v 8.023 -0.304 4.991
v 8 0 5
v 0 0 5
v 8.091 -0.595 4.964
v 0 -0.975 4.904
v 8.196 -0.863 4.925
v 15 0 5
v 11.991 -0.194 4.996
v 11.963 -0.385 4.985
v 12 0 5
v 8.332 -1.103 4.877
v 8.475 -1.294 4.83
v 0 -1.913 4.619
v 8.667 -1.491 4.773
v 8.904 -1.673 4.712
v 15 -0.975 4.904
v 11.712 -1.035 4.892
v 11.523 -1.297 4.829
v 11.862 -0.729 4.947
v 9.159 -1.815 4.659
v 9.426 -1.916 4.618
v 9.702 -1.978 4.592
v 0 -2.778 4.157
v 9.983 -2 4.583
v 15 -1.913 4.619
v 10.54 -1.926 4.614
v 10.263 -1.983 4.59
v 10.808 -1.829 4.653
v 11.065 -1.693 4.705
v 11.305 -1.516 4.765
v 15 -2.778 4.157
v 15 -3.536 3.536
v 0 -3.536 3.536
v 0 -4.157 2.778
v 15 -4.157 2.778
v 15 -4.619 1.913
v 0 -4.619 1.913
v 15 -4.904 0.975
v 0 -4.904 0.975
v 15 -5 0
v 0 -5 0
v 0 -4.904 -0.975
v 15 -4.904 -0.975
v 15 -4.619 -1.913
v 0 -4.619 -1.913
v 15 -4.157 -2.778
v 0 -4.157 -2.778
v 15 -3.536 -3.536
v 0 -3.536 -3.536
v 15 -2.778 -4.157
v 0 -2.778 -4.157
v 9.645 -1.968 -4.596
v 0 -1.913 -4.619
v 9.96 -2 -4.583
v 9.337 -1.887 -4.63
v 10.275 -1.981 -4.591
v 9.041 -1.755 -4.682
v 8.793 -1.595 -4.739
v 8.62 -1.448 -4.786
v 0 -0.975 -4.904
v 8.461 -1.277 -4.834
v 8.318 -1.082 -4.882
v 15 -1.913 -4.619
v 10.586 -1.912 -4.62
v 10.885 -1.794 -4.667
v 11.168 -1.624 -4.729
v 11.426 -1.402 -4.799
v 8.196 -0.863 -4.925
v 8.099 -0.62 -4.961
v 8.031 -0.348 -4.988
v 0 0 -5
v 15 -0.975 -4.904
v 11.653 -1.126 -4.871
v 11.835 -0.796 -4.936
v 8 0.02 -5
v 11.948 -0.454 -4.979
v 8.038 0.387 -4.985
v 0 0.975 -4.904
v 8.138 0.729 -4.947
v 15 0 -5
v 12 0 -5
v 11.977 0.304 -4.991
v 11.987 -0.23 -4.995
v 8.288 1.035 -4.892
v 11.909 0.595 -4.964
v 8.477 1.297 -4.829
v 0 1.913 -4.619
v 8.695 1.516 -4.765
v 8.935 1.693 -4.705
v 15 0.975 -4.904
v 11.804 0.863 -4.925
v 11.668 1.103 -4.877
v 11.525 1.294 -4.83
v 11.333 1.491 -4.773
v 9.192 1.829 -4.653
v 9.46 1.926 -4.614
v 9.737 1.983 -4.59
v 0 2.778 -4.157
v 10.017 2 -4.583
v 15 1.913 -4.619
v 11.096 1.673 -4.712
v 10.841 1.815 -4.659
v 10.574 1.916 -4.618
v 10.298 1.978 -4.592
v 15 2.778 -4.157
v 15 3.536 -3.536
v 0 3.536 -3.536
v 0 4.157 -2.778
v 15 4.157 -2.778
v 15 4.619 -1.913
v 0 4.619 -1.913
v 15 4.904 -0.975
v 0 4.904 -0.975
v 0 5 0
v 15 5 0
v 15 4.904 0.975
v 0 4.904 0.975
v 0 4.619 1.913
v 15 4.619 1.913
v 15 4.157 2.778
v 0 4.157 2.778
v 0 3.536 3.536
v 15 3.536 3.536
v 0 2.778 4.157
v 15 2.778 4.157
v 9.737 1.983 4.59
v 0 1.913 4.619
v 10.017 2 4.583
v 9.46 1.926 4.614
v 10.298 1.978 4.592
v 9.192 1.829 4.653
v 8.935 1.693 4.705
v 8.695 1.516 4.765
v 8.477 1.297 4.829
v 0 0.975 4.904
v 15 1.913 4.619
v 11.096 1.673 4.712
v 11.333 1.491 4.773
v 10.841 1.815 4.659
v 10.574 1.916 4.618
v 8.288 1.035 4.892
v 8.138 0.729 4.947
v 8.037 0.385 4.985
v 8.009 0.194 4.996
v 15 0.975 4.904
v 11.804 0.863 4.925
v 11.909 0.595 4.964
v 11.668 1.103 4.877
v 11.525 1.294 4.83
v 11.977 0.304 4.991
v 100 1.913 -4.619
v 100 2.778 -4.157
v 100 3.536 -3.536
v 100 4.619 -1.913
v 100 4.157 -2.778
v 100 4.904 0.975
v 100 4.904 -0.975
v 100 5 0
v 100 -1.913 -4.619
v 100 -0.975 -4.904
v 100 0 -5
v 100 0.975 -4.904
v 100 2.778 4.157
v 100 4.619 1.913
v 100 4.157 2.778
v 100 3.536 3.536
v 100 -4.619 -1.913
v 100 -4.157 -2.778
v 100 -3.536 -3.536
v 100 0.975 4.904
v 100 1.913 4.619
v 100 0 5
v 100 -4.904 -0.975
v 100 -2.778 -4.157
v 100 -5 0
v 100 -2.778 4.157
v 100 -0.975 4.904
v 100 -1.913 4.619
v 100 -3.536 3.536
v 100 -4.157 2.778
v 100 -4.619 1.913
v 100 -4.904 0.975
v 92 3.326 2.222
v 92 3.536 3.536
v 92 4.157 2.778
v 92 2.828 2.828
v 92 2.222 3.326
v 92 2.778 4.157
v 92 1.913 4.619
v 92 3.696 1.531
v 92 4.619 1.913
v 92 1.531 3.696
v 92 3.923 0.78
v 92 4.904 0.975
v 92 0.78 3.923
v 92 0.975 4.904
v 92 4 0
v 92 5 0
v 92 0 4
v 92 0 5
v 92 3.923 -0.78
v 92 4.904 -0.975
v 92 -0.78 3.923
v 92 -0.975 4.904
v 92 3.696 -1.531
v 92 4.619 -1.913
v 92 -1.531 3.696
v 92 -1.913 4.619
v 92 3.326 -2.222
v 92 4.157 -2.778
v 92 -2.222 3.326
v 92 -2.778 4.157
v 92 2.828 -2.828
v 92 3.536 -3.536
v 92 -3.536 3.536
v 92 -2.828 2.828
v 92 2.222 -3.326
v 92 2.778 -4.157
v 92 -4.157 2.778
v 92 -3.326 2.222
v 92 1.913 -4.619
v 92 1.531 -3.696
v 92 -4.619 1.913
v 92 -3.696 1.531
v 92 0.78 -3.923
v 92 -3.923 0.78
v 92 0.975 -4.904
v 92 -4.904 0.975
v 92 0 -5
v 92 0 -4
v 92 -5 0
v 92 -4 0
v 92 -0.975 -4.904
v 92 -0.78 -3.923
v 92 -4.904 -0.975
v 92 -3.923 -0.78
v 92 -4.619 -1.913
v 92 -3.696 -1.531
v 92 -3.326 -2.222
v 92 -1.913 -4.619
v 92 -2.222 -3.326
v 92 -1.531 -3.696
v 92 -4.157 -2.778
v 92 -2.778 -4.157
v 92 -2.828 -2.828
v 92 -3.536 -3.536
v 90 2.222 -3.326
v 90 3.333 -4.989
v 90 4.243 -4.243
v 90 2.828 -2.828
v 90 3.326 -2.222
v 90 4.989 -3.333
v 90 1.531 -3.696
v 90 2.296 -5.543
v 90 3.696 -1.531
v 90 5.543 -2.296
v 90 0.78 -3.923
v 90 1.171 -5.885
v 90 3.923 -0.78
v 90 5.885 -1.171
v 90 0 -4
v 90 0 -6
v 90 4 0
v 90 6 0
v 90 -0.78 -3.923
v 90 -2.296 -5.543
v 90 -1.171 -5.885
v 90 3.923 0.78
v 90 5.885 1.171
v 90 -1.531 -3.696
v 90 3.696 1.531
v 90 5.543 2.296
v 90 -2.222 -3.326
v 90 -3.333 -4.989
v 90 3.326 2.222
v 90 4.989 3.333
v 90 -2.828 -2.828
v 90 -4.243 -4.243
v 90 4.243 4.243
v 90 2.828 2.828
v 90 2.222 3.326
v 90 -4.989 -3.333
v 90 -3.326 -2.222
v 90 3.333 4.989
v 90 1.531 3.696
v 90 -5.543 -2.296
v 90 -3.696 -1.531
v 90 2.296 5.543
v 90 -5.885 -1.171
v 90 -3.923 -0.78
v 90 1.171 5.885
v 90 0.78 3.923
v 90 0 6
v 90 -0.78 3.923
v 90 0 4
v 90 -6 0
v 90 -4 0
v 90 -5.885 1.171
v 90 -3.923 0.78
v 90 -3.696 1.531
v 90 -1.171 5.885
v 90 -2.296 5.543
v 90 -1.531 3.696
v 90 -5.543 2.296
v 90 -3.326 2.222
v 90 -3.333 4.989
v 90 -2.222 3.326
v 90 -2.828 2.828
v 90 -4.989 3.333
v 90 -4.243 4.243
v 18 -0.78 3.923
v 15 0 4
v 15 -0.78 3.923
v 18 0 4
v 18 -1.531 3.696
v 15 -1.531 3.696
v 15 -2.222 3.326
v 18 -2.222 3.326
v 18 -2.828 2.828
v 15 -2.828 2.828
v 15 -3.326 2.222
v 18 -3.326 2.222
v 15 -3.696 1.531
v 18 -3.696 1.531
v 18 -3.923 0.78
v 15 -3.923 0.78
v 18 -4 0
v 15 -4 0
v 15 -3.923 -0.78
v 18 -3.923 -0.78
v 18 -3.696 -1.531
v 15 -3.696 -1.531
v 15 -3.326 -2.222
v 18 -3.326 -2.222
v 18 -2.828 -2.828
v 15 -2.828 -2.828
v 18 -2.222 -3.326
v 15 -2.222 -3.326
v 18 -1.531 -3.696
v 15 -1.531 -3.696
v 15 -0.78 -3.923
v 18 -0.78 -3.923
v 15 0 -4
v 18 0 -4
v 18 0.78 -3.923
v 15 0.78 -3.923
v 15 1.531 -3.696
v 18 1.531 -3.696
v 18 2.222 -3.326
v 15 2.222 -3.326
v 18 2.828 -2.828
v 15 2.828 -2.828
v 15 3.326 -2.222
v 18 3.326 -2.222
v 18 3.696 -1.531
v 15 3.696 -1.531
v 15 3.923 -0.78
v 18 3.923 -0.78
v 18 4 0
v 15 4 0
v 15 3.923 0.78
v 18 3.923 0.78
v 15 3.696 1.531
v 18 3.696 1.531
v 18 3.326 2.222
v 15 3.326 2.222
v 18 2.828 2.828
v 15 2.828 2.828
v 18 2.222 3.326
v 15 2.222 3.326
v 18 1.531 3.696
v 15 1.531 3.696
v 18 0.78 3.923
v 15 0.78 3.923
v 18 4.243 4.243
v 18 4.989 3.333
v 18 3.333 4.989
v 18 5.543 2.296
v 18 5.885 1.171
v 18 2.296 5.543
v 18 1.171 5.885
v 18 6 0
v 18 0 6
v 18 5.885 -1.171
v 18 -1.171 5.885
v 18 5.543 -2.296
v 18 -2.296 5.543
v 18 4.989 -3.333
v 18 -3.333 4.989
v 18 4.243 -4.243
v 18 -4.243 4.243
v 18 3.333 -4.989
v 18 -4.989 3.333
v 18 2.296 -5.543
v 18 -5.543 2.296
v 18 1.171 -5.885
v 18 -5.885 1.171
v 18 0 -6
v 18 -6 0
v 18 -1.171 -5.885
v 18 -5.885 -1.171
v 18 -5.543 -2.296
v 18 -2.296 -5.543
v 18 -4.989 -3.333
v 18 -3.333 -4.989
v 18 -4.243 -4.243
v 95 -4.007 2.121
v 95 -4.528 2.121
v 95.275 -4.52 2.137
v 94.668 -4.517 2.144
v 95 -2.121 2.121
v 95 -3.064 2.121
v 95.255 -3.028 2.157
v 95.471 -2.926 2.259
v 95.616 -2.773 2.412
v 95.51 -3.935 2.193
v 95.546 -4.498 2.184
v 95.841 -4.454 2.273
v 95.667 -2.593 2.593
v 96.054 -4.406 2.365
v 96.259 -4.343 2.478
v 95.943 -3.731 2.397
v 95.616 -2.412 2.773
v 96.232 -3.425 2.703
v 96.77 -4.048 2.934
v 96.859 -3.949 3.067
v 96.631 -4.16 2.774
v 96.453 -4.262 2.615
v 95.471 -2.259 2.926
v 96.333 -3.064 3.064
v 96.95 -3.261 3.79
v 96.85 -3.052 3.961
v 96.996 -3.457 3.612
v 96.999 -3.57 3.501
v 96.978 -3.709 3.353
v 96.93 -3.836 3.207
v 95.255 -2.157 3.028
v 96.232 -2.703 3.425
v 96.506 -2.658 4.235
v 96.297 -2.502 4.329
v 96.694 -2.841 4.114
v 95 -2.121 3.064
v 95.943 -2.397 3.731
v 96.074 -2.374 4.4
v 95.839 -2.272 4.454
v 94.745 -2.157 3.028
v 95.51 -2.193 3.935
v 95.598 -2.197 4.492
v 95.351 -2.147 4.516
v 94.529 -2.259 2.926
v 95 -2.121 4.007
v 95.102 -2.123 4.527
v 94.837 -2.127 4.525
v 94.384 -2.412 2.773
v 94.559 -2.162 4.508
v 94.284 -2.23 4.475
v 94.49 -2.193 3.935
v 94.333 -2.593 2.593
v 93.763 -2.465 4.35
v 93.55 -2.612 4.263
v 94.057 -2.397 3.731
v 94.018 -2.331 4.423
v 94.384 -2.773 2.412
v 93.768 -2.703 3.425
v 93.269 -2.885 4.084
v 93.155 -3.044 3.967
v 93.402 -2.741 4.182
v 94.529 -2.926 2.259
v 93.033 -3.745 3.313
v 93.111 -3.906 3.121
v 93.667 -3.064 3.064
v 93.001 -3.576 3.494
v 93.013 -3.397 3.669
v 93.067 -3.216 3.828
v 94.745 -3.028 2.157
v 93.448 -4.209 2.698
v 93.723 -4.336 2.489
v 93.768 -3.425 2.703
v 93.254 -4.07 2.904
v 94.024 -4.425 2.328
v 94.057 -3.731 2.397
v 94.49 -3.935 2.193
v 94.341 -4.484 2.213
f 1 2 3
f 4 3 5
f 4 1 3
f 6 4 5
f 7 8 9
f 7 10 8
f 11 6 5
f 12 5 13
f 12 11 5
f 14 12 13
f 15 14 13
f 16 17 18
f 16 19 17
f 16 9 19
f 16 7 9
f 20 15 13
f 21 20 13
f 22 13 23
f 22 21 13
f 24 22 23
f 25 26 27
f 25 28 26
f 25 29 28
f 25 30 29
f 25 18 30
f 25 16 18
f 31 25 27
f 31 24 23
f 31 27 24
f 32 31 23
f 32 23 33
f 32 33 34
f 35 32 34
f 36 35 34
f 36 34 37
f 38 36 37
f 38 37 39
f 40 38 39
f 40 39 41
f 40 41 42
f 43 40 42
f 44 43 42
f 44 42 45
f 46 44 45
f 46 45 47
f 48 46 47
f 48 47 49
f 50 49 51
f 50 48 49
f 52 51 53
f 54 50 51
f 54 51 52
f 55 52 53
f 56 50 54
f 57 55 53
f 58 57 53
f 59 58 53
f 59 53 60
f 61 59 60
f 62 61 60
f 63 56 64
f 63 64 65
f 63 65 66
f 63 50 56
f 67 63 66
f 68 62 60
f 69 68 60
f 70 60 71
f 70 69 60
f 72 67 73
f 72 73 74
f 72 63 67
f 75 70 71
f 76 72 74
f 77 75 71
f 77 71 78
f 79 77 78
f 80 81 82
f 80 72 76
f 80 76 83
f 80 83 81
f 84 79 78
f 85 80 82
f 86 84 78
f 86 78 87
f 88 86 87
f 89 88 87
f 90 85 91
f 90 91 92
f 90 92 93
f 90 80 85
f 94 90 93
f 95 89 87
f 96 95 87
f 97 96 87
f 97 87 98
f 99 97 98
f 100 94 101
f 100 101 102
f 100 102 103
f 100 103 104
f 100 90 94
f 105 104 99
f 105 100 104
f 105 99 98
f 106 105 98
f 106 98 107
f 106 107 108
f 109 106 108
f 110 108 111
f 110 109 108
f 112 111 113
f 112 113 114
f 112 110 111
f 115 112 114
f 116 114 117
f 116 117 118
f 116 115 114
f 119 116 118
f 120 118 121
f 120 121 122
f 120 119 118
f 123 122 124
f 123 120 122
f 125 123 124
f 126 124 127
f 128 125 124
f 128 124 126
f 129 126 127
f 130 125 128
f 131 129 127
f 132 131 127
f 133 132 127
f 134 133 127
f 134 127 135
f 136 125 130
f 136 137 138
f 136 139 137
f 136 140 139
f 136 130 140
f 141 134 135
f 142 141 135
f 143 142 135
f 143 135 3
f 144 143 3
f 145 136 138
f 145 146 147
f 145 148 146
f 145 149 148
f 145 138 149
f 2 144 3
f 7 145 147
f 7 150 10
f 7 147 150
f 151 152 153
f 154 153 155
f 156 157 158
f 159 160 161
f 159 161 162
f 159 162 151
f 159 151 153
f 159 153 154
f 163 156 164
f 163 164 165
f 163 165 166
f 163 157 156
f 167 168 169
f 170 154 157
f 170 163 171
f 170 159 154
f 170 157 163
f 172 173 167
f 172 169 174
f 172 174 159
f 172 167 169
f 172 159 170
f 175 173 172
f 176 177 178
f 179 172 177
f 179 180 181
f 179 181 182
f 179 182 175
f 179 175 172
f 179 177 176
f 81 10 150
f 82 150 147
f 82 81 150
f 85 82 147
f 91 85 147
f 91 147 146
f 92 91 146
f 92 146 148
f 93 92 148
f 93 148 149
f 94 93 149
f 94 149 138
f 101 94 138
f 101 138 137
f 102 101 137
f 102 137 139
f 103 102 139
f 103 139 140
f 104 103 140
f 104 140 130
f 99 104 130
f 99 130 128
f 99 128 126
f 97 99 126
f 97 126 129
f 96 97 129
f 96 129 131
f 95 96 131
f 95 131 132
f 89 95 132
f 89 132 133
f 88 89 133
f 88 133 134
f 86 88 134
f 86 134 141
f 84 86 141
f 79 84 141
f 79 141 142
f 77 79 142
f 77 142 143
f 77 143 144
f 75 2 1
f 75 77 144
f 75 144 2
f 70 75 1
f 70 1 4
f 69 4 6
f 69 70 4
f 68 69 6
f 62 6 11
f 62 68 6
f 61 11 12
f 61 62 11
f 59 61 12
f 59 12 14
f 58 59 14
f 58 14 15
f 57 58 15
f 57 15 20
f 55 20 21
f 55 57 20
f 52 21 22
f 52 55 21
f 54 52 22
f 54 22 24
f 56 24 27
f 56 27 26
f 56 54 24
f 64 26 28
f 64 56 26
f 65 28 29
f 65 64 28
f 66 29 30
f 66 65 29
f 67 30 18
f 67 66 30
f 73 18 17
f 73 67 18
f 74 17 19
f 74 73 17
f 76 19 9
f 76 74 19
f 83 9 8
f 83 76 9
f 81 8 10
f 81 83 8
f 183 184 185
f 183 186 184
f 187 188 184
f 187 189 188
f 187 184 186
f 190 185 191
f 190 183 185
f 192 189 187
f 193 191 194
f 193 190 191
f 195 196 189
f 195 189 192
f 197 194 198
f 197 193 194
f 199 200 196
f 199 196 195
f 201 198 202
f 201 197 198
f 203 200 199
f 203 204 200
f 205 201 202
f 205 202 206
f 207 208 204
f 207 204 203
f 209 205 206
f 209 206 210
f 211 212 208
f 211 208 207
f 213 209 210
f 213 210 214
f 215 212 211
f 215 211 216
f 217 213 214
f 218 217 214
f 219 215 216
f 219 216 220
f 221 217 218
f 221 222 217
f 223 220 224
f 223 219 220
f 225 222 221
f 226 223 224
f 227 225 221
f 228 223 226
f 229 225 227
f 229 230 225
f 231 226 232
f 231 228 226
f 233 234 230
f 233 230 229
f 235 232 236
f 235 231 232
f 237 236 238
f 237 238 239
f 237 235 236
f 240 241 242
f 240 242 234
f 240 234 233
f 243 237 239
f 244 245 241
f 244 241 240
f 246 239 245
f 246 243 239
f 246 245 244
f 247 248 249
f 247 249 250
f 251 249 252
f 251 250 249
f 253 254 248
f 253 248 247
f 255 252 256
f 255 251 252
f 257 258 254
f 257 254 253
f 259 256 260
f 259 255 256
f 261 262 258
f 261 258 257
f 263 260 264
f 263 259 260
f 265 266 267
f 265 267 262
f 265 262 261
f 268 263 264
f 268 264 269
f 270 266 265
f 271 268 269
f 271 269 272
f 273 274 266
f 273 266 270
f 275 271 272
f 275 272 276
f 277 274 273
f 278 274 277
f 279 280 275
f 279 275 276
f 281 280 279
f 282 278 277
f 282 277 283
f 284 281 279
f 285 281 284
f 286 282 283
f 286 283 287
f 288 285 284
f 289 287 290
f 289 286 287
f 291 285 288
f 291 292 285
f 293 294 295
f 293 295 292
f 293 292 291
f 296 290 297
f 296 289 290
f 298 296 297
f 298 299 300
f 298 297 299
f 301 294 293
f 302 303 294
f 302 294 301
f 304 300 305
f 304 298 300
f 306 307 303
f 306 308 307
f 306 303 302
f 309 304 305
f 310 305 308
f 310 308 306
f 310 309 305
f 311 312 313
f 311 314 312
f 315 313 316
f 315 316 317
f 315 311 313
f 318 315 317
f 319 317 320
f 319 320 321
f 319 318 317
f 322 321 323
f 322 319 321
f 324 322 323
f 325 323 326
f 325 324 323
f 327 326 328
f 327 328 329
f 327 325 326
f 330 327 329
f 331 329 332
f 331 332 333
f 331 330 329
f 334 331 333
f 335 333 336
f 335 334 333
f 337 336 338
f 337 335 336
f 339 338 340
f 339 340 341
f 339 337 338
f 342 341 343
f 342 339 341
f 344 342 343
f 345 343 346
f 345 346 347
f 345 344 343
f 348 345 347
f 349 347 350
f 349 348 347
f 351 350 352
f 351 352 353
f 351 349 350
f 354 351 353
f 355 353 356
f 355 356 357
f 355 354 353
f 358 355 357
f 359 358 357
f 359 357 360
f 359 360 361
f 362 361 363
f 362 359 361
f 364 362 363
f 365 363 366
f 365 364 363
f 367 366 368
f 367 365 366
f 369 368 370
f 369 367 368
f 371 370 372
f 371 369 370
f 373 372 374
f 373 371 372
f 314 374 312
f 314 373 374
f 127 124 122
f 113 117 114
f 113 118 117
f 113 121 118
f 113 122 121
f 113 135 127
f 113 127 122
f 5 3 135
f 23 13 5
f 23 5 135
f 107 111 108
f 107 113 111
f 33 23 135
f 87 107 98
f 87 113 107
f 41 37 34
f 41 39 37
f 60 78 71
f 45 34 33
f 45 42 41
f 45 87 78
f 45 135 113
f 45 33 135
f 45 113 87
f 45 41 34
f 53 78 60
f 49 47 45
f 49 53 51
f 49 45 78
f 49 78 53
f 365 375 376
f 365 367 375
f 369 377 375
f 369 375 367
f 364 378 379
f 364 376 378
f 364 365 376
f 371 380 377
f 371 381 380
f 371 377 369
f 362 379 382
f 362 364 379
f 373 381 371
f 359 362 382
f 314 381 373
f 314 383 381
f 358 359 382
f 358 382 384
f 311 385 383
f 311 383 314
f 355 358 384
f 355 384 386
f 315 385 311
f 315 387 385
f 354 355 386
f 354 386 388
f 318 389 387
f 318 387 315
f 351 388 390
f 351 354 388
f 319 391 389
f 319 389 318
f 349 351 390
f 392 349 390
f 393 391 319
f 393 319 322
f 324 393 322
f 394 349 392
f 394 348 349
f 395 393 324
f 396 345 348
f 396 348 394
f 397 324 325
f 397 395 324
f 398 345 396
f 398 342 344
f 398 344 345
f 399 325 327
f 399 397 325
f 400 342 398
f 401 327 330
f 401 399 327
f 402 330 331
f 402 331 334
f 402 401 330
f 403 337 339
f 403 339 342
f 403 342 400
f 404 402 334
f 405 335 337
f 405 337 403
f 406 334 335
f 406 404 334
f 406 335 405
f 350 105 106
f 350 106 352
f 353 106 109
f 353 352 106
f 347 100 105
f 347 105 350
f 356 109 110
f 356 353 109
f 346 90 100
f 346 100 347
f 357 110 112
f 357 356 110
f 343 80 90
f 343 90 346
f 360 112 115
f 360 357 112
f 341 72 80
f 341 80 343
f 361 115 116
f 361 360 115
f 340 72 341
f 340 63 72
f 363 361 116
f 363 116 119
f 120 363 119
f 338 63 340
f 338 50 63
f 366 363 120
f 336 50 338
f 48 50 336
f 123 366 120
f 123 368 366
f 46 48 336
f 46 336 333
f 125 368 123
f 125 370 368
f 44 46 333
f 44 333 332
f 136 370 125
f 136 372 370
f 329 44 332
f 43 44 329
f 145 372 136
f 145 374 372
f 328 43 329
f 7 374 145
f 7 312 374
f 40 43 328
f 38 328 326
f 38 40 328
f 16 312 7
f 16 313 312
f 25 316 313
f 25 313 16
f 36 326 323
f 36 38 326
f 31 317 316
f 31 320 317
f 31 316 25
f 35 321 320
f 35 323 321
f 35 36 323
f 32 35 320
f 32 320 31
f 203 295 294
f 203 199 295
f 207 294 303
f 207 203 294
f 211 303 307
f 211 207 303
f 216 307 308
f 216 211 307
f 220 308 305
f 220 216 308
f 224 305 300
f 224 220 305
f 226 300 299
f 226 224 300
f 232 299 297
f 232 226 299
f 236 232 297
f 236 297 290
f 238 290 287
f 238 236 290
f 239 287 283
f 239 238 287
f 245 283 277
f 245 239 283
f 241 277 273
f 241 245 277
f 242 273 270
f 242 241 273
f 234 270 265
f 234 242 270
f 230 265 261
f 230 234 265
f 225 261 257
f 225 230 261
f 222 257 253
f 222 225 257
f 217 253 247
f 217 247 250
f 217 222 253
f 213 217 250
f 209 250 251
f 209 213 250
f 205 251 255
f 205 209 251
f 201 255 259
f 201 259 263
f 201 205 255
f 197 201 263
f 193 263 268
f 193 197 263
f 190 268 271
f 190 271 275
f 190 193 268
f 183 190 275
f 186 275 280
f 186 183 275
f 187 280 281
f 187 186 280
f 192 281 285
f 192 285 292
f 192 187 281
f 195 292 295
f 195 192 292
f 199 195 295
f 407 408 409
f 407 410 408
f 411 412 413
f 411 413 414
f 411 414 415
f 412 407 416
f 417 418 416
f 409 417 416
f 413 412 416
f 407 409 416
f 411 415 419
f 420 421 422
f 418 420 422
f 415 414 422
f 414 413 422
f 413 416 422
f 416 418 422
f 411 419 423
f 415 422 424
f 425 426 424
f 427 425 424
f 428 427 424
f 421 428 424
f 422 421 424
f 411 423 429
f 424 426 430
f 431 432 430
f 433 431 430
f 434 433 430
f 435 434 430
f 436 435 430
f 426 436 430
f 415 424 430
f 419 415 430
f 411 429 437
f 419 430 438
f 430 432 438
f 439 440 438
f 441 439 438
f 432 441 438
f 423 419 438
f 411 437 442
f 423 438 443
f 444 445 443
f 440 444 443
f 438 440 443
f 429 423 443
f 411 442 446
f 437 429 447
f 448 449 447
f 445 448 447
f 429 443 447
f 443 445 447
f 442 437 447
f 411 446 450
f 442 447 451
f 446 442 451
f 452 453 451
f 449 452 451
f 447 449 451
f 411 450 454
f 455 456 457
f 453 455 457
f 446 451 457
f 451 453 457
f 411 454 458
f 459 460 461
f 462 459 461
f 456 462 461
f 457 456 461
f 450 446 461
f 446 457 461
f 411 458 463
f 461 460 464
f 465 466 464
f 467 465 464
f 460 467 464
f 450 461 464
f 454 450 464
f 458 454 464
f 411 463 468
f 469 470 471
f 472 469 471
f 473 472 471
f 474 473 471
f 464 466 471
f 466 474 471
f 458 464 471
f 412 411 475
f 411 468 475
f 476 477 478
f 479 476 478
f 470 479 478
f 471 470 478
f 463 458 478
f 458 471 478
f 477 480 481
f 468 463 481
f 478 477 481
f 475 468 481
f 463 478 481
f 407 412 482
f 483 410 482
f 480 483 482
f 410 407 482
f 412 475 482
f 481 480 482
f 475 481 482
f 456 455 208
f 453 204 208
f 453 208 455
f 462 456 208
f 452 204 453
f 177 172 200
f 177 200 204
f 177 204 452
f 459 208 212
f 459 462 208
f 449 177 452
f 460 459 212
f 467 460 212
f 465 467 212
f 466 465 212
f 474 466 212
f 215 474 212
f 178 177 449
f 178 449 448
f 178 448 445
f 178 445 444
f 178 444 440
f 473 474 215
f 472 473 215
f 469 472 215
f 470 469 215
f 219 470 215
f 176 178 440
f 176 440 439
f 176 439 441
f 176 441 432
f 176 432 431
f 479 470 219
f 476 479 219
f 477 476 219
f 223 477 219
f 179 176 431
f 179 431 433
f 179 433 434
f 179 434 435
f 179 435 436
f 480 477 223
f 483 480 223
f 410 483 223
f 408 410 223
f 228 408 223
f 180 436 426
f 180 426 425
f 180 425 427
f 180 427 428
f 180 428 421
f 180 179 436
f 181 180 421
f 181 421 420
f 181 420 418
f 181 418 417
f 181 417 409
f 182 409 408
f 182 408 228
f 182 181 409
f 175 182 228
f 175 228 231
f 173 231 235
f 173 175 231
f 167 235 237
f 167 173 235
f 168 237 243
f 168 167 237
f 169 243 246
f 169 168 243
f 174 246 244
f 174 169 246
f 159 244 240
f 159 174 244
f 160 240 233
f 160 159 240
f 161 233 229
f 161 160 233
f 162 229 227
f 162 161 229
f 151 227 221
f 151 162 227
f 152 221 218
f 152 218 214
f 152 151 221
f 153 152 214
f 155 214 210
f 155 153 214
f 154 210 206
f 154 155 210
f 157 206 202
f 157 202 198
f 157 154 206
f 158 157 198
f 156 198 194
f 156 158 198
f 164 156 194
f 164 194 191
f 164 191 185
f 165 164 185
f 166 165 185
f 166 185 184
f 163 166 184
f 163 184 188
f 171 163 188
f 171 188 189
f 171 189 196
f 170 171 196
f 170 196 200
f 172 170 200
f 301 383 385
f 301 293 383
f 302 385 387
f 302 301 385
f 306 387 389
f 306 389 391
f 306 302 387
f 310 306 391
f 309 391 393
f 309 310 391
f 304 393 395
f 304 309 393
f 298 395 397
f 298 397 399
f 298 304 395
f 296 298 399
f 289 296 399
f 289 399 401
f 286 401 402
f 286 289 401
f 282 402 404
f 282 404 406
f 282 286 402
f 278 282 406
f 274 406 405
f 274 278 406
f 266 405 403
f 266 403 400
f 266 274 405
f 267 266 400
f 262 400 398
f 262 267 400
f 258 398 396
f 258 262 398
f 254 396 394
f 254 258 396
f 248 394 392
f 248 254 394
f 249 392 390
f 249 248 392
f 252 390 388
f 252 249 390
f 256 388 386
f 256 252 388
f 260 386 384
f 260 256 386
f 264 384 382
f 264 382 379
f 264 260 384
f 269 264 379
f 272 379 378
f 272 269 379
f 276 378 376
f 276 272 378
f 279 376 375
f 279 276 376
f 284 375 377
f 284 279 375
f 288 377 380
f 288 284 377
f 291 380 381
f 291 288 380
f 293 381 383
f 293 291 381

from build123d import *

# Parameters (mm, degrees)
CUT_EXTRUDE_1_DEPTH      = 101.359354322
CUT_EXTRUDE_1_DEPTH_BACK = 101.359354322
SKETCH_2_R               = 2


with BuildPart() as part:
    # 草图1 → 旋转1 (revolve)
    with BuildSketch(Plane.XY, mode=Mode.PRIVATE) as revolve_1_sk:
        Polygon((0, 0), (0, 5), (15, 5), (15, 4), (18, 4), (18, 6), (90, 6), (90, 4), (92, 4), (92, 5), (100, 5), (100, 0), align=None)
    revolve(revolve_1_sk.sketch.rotate(Axis((0, 0, 0), (1, 0, 0)), 90), axis=Axis((0, 0, 0), (1, 0, 0)))

    # 草图2 → 切除-拉伸1 (cut, two sides: drawn at the far end of the back side and taken through both)
    with BuildSketch(Plane.XY.offset(-CUT_EXTRUDE_1_DEPTH_BACK)):
        with Locations((10, 0)):
            Circle(SKETCH_2_R)
    extrude(amount=CUT_EXTRUDE_1_DEPTH + CUT_EXTRUDE_1_DEPTH_BACK, mode=Mode.SUBTRACT)

    # 草图4 → 切除-旋转1 (revolve, cut)
    with BuildSketch(Plane(origin=(95, 0, 0), x_dir=(0, 0, -1), z_dir=(1, 0, 0))):
        Polygon((-2.121320344, -2.121320344), (-2.121320344, -4.949747468), (-3.535533906, -3.535533906), align=None)
    revolve(axis=Axis((95, 0, 0), (0, -0.7071067811865489, 0.7071067811865462)), mode=Mode.SUBTRACT)


solid = part.part
